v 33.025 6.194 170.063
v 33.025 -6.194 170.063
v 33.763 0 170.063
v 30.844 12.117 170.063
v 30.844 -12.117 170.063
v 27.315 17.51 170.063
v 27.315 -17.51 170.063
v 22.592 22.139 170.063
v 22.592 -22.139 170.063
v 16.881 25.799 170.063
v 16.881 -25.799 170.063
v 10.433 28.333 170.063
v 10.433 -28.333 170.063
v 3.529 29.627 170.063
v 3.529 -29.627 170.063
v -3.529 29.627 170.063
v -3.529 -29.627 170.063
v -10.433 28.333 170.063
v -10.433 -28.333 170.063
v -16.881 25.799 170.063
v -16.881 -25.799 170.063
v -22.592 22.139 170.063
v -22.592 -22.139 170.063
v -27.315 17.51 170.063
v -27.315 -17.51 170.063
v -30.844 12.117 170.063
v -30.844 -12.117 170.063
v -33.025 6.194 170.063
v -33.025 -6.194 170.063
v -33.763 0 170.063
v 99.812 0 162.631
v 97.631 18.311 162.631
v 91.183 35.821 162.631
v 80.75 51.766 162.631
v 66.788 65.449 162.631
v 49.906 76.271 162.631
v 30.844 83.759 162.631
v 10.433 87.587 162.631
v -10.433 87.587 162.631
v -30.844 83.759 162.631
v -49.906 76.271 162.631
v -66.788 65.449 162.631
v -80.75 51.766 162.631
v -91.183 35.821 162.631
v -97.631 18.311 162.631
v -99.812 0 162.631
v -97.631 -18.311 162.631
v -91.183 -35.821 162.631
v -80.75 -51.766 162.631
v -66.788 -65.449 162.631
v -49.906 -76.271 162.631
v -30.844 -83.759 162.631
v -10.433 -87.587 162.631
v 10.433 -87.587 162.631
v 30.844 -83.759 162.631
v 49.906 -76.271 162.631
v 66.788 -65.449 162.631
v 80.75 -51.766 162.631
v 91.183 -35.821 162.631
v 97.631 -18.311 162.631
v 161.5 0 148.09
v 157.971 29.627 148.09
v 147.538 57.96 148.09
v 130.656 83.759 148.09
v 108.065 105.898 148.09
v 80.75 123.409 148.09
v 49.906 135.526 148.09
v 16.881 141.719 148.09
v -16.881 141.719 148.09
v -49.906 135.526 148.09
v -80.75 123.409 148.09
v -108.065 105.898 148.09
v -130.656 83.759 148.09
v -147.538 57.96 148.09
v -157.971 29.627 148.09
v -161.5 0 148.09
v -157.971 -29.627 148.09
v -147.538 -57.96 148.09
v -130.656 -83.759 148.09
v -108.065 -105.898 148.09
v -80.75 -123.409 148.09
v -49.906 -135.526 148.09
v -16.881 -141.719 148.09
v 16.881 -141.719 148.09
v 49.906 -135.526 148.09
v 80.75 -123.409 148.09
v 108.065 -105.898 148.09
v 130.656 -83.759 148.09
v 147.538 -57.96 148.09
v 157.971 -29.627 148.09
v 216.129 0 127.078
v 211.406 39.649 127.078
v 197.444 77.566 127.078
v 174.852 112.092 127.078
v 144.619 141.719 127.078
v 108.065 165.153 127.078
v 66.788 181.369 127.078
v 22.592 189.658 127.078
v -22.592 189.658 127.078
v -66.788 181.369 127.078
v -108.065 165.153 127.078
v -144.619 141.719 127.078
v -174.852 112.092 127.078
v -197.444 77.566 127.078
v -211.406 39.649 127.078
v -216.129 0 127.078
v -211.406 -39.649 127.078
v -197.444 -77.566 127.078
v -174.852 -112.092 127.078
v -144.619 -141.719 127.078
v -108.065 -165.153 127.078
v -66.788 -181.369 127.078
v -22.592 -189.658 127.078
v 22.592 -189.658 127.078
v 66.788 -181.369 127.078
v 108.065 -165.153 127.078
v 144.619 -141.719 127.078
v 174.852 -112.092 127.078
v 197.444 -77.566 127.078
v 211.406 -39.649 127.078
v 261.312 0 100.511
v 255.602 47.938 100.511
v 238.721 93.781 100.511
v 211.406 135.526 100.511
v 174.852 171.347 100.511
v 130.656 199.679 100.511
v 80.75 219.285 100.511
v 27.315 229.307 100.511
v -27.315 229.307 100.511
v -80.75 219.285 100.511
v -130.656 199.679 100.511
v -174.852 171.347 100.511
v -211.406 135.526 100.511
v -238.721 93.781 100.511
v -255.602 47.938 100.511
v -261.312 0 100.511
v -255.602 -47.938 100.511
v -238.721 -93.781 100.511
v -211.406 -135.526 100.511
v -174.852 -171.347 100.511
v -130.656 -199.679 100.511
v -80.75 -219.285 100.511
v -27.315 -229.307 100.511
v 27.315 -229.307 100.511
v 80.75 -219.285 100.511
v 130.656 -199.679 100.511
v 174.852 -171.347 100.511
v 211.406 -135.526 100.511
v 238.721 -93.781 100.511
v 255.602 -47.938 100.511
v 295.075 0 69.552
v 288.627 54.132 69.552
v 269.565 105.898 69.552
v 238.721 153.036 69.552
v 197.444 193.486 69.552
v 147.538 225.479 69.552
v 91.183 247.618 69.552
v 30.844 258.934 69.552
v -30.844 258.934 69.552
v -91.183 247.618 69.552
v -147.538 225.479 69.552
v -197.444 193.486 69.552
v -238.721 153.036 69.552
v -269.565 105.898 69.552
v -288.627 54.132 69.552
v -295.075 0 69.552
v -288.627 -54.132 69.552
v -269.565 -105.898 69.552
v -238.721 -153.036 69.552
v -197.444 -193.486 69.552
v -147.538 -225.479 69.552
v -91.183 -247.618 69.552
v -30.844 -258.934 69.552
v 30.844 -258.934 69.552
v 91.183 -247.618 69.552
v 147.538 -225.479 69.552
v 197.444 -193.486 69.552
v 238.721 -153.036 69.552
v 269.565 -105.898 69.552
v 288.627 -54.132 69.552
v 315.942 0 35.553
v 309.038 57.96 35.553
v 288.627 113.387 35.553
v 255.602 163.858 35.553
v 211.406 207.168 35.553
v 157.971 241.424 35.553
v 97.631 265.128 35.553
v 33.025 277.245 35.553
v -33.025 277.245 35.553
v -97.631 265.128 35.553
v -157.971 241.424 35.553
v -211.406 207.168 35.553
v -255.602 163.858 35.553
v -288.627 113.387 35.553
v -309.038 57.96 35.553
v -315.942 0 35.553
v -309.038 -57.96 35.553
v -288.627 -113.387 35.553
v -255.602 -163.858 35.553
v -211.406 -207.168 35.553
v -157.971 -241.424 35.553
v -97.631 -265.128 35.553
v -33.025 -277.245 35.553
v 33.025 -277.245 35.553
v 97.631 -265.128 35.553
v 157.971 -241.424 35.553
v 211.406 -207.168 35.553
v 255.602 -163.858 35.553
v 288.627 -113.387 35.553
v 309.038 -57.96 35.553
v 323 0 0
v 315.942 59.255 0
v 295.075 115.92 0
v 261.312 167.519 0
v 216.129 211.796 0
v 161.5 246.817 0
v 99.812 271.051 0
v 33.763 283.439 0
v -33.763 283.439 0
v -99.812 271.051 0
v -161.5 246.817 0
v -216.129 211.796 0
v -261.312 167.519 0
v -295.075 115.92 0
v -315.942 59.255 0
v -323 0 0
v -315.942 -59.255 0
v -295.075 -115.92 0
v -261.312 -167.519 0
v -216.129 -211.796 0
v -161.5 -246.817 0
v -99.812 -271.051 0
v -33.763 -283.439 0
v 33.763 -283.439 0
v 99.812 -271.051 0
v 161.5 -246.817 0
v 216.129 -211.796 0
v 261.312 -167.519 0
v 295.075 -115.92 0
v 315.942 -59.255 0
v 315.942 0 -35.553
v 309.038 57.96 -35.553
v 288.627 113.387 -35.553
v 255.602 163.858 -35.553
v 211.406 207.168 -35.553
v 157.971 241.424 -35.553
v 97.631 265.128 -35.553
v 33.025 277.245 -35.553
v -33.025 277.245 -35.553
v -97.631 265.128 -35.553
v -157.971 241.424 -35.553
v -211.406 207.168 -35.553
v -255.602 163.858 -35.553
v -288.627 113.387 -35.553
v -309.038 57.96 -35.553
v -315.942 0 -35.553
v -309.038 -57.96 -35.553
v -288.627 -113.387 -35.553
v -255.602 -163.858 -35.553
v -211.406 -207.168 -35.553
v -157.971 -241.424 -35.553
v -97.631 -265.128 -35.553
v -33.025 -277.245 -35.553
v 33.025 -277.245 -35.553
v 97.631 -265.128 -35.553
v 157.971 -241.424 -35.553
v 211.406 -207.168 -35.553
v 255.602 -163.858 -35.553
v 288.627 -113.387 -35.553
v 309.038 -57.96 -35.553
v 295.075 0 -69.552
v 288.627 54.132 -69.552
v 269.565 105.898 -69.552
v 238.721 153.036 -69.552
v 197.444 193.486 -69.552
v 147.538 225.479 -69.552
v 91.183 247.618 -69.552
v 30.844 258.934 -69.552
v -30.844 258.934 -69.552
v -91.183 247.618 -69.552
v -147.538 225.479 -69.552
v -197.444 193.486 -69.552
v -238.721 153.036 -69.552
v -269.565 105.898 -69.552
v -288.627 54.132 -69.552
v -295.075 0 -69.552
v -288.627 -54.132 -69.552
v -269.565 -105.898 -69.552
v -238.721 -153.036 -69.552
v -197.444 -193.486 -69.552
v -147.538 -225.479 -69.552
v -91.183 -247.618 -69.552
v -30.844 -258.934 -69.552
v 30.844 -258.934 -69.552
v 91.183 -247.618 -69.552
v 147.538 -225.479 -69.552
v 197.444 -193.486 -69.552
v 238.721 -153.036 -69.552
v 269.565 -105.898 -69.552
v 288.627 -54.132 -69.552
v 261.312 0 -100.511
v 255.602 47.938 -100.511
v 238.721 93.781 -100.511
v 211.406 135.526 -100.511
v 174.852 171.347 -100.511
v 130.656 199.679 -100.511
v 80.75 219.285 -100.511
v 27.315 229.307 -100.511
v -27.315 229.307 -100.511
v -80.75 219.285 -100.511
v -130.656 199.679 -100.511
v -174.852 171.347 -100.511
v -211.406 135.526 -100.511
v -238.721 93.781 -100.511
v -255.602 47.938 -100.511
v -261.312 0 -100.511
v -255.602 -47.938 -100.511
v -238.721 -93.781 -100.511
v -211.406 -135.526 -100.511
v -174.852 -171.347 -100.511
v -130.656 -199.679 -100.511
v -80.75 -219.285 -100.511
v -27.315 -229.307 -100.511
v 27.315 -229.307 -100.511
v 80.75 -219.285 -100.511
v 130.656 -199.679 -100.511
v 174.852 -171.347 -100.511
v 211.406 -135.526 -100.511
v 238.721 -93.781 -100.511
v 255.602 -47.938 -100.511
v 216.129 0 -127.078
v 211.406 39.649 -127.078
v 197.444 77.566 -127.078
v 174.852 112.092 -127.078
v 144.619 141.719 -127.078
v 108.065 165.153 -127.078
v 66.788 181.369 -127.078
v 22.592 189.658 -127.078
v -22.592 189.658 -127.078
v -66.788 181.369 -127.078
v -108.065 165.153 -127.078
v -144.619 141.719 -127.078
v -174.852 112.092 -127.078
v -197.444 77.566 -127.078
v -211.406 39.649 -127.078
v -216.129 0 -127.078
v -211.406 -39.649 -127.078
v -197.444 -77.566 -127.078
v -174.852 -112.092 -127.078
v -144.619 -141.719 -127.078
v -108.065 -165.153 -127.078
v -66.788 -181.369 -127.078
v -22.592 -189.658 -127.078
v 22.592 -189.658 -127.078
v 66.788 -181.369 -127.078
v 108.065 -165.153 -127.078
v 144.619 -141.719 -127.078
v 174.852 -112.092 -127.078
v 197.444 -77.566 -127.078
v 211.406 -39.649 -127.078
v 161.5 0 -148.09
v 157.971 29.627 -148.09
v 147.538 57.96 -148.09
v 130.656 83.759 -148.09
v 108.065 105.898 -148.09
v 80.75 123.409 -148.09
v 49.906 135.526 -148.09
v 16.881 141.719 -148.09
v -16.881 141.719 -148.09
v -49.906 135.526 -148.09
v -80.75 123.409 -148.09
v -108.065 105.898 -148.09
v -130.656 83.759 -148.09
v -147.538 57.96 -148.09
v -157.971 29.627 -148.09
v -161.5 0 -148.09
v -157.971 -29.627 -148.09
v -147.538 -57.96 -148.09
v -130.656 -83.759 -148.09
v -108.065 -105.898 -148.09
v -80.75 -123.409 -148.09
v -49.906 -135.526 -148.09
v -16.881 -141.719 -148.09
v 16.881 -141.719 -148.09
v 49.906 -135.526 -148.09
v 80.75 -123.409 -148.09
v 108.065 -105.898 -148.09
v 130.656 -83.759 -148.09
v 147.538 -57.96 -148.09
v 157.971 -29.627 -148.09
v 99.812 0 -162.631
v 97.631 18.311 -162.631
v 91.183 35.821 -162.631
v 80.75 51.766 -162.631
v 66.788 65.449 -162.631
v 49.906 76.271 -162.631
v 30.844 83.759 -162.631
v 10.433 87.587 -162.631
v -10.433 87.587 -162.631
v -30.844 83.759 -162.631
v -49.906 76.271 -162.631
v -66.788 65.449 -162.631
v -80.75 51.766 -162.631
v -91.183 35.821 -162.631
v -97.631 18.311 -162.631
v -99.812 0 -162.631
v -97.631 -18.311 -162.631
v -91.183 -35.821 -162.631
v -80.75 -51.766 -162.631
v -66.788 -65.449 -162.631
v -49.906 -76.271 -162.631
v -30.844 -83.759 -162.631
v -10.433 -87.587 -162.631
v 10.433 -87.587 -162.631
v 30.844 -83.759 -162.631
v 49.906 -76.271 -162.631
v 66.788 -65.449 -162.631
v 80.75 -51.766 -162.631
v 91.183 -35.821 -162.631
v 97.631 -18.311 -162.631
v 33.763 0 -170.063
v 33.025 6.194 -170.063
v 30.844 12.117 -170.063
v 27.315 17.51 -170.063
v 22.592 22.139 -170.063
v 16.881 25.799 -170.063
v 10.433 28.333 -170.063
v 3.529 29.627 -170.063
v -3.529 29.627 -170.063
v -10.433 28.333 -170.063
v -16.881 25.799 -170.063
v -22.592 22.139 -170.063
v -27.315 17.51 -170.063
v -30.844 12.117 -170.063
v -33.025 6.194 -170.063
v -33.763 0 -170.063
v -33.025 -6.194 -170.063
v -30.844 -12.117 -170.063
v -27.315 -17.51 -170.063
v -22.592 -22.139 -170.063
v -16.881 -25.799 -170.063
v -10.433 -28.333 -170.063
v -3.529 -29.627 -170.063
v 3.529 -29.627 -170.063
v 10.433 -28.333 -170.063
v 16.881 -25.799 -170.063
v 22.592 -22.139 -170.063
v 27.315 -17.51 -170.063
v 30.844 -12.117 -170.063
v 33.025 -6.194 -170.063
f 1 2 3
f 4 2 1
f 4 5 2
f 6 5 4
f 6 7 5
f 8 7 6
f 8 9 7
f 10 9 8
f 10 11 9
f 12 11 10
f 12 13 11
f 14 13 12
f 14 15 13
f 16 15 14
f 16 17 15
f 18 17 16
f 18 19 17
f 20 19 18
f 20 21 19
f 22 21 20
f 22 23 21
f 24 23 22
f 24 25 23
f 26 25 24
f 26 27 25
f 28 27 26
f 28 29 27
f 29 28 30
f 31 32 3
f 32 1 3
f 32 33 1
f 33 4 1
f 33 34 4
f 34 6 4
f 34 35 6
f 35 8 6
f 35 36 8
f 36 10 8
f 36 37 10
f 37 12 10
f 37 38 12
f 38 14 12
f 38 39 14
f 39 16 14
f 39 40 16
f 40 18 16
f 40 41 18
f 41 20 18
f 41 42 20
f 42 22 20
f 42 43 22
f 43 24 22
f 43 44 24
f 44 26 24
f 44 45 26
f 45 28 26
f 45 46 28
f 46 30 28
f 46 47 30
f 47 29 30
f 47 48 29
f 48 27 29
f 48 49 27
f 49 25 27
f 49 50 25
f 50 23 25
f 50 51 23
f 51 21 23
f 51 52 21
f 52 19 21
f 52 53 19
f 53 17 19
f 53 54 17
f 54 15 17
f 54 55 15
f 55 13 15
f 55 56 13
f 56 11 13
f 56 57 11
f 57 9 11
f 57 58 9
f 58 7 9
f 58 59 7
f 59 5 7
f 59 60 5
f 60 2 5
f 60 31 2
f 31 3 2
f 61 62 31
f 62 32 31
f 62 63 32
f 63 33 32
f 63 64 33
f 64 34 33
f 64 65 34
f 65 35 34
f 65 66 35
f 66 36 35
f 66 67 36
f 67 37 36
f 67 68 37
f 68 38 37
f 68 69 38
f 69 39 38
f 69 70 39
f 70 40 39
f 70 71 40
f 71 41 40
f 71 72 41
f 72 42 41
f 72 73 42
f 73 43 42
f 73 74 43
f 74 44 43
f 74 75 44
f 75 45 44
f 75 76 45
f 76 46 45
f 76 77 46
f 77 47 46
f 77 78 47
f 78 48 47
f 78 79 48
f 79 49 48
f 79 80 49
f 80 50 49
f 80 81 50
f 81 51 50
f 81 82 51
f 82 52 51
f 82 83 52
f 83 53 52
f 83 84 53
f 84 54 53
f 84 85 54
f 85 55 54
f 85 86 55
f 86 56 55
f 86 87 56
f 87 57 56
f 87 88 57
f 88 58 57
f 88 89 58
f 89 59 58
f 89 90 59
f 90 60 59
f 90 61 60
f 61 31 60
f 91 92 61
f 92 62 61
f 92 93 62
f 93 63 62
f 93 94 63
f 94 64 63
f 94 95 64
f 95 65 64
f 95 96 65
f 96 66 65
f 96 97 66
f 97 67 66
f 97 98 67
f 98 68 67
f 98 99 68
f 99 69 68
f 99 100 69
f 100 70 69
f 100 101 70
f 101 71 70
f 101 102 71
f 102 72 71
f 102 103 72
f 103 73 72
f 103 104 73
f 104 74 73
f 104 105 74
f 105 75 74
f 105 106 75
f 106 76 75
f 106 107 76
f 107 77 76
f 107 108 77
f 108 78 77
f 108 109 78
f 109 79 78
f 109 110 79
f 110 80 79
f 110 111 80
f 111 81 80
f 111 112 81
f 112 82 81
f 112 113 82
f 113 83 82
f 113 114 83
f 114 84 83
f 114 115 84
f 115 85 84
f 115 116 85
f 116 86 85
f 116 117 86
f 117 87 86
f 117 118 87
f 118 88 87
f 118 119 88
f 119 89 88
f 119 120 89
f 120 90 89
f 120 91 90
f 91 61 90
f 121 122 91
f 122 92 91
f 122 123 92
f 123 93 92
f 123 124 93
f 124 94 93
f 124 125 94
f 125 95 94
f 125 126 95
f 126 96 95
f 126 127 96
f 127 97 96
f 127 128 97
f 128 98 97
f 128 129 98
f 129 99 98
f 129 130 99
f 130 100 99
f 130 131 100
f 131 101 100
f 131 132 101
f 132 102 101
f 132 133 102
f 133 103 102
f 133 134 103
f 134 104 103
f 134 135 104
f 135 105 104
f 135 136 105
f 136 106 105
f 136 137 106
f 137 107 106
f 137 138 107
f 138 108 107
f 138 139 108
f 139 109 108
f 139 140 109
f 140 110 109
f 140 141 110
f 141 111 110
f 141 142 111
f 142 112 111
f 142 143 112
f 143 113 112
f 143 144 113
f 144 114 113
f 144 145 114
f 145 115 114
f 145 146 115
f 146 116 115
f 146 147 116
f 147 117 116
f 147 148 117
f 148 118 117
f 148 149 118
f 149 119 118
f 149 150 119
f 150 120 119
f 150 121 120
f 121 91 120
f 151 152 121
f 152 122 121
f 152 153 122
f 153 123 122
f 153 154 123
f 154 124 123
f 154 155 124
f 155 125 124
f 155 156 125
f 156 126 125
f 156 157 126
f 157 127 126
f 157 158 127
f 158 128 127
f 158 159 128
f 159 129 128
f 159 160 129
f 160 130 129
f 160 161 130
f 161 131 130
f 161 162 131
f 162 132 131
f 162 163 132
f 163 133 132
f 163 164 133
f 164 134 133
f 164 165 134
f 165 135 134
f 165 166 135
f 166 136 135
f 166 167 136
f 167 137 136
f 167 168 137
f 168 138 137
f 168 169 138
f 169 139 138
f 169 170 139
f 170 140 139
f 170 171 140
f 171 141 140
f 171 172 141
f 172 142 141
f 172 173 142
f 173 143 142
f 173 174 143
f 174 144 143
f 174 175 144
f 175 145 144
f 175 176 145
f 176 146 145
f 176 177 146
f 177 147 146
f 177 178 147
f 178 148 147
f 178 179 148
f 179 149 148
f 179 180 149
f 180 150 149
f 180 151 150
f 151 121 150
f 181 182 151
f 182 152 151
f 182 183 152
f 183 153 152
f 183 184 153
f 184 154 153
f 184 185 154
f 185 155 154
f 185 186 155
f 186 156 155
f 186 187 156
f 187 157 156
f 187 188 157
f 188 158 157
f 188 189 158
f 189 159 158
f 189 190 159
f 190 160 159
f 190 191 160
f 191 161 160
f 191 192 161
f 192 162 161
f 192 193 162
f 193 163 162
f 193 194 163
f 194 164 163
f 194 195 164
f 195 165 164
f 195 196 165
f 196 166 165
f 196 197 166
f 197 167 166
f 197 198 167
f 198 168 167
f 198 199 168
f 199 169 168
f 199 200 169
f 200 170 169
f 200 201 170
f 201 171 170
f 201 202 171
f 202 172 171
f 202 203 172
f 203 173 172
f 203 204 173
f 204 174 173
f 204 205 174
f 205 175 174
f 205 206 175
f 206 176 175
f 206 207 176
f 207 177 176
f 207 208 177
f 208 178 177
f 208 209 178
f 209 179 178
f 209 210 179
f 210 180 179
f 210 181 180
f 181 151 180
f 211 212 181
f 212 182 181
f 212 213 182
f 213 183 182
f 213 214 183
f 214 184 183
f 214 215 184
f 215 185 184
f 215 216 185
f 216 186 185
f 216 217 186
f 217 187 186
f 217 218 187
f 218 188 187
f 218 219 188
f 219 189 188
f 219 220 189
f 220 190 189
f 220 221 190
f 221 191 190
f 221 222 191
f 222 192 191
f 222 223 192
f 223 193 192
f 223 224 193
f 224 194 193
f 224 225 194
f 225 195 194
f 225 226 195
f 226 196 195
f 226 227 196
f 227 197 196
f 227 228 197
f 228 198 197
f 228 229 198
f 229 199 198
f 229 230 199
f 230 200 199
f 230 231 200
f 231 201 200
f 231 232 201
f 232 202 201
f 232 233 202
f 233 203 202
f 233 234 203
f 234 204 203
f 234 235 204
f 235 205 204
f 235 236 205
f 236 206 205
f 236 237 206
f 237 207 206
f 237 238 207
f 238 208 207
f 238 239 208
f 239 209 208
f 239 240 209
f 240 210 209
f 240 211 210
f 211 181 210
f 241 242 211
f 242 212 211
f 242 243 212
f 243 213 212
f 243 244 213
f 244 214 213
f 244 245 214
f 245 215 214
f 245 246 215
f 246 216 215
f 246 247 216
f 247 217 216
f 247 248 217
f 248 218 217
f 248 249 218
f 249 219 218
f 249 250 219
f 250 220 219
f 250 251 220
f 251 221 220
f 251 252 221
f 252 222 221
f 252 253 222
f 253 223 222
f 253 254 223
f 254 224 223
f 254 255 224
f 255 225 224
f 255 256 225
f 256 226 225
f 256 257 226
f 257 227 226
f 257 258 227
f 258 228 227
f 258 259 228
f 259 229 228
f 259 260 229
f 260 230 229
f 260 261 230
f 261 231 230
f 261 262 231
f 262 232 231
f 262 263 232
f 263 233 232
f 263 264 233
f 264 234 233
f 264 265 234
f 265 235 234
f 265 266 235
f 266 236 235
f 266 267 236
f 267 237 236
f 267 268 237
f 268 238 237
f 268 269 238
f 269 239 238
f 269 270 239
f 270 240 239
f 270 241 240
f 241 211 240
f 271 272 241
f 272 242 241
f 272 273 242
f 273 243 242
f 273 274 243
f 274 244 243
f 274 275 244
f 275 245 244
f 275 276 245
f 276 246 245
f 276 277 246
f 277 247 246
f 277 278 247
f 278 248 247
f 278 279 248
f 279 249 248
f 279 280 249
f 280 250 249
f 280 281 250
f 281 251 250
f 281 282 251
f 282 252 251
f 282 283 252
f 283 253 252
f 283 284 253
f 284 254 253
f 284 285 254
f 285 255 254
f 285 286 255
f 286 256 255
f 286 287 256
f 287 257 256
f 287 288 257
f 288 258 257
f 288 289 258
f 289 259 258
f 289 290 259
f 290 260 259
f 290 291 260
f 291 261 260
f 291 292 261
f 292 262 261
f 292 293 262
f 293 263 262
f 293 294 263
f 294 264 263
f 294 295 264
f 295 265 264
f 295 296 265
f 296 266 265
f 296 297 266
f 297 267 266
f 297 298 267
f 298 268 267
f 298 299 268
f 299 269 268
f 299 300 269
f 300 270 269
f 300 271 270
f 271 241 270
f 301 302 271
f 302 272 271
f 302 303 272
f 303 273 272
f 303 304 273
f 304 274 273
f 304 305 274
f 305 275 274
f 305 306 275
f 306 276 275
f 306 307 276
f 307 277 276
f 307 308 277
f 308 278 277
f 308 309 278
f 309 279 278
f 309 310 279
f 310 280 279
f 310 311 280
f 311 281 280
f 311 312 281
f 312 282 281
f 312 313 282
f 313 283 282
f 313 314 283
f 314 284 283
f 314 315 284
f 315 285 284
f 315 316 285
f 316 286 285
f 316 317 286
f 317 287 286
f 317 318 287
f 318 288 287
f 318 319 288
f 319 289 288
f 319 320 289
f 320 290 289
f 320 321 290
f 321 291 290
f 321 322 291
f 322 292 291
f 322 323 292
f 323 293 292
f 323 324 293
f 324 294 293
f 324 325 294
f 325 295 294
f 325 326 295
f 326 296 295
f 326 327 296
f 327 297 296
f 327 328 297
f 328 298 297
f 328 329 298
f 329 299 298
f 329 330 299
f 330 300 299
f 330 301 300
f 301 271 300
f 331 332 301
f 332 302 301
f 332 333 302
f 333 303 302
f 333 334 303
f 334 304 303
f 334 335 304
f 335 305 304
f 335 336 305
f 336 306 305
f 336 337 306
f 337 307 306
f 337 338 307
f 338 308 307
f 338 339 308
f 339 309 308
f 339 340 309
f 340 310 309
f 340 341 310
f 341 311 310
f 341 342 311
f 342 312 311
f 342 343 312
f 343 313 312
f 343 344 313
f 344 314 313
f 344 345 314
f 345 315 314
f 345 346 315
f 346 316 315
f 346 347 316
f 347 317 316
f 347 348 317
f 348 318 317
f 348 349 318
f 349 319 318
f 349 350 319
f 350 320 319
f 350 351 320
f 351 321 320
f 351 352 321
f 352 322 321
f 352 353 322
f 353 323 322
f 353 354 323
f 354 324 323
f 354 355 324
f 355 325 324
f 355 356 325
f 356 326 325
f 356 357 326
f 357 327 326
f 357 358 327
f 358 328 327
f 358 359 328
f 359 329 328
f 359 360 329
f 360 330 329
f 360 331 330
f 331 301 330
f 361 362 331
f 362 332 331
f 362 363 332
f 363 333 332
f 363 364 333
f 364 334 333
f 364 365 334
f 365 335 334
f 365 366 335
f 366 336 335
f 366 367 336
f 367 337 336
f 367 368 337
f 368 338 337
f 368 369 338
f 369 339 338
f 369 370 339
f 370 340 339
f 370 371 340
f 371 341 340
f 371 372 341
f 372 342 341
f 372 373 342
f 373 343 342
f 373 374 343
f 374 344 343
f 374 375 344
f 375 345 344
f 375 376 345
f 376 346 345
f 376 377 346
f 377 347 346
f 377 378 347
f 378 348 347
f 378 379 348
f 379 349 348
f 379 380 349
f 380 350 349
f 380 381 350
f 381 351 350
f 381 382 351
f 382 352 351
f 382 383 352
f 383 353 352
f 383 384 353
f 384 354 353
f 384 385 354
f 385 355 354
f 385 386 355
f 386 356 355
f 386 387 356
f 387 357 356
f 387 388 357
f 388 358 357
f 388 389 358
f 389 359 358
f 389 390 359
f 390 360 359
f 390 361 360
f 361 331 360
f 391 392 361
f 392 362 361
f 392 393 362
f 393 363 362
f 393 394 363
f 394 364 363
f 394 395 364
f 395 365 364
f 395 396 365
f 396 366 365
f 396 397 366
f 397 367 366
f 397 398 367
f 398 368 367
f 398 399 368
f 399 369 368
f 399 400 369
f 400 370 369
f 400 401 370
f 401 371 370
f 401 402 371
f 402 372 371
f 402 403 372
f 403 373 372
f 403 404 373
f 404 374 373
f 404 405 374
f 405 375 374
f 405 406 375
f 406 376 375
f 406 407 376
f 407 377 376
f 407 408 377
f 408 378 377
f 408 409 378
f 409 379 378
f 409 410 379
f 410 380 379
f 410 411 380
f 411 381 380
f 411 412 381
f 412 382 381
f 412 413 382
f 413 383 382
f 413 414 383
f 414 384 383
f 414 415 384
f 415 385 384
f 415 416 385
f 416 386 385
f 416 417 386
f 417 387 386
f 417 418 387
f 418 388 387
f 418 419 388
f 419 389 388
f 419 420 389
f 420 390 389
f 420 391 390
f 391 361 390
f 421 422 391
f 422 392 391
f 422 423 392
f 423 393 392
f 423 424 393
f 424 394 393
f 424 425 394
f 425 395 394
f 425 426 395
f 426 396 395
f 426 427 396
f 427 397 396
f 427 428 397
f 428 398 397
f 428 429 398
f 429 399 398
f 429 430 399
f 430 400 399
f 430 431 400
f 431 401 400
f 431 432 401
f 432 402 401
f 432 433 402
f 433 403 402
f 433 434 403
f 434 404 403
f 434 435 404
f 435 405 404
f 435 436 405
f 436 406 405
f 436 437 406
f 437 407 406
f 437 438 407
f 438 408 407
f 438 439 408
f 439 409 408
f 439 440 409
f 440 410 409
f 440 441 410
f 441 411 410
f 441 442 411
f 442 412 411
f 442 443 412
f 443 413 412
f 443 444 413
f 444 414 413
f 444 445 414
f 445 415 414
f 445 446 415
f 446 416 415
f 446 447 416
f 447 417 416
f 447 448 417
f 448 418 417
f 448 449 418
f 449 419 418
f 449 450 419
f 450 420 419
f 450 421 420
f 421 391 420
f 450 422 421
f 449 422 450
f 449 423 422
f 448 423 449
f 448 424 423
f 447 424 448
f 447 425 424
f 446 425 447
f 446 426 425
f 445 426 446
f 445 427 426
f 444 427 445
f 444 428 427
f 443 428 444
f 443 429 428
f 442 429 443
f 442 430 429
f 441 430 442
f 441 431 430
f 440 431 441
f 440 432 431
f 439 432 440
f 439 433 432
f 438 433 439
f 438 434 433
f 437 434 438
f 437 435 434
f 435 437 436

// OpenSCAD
// Generated by SolidPython 1.0.1 on 2020-07-29 00:46:53


scale(v = [17, 15, 9]) {
	sphere(r = 19);
}
/***********************************************
*********      SolidPython code:      **********
************************************************
 
# import packages: SolidPython
from solid import *
from solid.utils import *
from itertools import chain, combinations, permutations


class Resize:

    def __init__(self, scad_file):
        self.scad_file = scad_file
        #self.scad_file = import_scad(scad_file)
        # cone/cylinder param:
        self.r1 = 0
        self.r2 = 0
        self.h = 0
        # rectangular prism param:
        self.w = 0
        self.l = 0
        # ellipse param:
        self.r = 0

    # import OpenScad code (file name corresponds to shape)


    # classify shape + parameters
    def assign(self, param1, param2, param3):
        if self.scad_file == 'cone.scad':
            self.r1 = param1
            self.r2 = param2
            self.h = param3
        elif self.scad_file == 'cylinder.scad':
            self.r1 = param1
            self.r2 = param2
            self.h = param3
        elif self.scad_file == 'rectangularPrism.scad':
            self.h = param1
            self.l = param2
            self.w = param3
        else:
            self.r = param1
            self.h = param2

    # resize parameters
    def iterate(self):
        x = range(3, 20, 2)
        i = 1
        if self.scad_file == 'cone.scad':
            tempList = list(permutations(x, 2))
            for temp in tempList:
                param1 = temp[0]
                param2 = temp[1]
                filepath = 'produced_scad_files/' + 'cone' + str(param1) + '_' + str(param2) + '_' + '.scad'
                scad_render_to_file(cylinder(h=param1, r1=param2, r2=0), filepath)

        elif self.scad_file == 'cylinder.scad':
            tempList = list(permutations(x, 3))
            for temp in tempList:
                param1 = temp[0]
                param2 = temp[1]
                filepath = 'produced_scad_files/' + 'cylinder' + str(param1) + '_' + str(param2) + '_' + '.scad'
                scad_render_to_file(cylinder(h=param1, r1=param2, r2=param2), filepath)

        elif self.scad_file == 'rectangularPrism.scad':
            tempList = list(permutations(x, 3))
            for temp in tempList:
                param1 = temp[0]
                param2 = temp[1]
                param3 = temp[2]
                filepath = 'produced_scad_files/' + 'rectangularPrism' + str(param1) + '_' + str(param2) + '_' + str(
                    param3) + '.scad'
                scad_render_to_file(cube(size=(param1, param2, param3)), filepath)

        elif self.scad_file == 'ellipse.scad':
            tempList = list(permutations(x, 4))
            for temp in tempList:
                param1 = temp[0]
                param2 = temp[1]
                param3 = temp[2]
                param4 = temp[3]
                filepath = 'produced_scad_files/' + 'ellipse' + str(param1) + '_' + str(param2) + '_' + str(param3) + '_' + str(param4) + '.scad'
                scad_render_to_file(scale([param1, param2, param3])(sphere(r=param4)), filepath)

    def render_to_scadfile(self):
        scad_render_to_file(scad, 'example.scad') 
 
************************************************/
